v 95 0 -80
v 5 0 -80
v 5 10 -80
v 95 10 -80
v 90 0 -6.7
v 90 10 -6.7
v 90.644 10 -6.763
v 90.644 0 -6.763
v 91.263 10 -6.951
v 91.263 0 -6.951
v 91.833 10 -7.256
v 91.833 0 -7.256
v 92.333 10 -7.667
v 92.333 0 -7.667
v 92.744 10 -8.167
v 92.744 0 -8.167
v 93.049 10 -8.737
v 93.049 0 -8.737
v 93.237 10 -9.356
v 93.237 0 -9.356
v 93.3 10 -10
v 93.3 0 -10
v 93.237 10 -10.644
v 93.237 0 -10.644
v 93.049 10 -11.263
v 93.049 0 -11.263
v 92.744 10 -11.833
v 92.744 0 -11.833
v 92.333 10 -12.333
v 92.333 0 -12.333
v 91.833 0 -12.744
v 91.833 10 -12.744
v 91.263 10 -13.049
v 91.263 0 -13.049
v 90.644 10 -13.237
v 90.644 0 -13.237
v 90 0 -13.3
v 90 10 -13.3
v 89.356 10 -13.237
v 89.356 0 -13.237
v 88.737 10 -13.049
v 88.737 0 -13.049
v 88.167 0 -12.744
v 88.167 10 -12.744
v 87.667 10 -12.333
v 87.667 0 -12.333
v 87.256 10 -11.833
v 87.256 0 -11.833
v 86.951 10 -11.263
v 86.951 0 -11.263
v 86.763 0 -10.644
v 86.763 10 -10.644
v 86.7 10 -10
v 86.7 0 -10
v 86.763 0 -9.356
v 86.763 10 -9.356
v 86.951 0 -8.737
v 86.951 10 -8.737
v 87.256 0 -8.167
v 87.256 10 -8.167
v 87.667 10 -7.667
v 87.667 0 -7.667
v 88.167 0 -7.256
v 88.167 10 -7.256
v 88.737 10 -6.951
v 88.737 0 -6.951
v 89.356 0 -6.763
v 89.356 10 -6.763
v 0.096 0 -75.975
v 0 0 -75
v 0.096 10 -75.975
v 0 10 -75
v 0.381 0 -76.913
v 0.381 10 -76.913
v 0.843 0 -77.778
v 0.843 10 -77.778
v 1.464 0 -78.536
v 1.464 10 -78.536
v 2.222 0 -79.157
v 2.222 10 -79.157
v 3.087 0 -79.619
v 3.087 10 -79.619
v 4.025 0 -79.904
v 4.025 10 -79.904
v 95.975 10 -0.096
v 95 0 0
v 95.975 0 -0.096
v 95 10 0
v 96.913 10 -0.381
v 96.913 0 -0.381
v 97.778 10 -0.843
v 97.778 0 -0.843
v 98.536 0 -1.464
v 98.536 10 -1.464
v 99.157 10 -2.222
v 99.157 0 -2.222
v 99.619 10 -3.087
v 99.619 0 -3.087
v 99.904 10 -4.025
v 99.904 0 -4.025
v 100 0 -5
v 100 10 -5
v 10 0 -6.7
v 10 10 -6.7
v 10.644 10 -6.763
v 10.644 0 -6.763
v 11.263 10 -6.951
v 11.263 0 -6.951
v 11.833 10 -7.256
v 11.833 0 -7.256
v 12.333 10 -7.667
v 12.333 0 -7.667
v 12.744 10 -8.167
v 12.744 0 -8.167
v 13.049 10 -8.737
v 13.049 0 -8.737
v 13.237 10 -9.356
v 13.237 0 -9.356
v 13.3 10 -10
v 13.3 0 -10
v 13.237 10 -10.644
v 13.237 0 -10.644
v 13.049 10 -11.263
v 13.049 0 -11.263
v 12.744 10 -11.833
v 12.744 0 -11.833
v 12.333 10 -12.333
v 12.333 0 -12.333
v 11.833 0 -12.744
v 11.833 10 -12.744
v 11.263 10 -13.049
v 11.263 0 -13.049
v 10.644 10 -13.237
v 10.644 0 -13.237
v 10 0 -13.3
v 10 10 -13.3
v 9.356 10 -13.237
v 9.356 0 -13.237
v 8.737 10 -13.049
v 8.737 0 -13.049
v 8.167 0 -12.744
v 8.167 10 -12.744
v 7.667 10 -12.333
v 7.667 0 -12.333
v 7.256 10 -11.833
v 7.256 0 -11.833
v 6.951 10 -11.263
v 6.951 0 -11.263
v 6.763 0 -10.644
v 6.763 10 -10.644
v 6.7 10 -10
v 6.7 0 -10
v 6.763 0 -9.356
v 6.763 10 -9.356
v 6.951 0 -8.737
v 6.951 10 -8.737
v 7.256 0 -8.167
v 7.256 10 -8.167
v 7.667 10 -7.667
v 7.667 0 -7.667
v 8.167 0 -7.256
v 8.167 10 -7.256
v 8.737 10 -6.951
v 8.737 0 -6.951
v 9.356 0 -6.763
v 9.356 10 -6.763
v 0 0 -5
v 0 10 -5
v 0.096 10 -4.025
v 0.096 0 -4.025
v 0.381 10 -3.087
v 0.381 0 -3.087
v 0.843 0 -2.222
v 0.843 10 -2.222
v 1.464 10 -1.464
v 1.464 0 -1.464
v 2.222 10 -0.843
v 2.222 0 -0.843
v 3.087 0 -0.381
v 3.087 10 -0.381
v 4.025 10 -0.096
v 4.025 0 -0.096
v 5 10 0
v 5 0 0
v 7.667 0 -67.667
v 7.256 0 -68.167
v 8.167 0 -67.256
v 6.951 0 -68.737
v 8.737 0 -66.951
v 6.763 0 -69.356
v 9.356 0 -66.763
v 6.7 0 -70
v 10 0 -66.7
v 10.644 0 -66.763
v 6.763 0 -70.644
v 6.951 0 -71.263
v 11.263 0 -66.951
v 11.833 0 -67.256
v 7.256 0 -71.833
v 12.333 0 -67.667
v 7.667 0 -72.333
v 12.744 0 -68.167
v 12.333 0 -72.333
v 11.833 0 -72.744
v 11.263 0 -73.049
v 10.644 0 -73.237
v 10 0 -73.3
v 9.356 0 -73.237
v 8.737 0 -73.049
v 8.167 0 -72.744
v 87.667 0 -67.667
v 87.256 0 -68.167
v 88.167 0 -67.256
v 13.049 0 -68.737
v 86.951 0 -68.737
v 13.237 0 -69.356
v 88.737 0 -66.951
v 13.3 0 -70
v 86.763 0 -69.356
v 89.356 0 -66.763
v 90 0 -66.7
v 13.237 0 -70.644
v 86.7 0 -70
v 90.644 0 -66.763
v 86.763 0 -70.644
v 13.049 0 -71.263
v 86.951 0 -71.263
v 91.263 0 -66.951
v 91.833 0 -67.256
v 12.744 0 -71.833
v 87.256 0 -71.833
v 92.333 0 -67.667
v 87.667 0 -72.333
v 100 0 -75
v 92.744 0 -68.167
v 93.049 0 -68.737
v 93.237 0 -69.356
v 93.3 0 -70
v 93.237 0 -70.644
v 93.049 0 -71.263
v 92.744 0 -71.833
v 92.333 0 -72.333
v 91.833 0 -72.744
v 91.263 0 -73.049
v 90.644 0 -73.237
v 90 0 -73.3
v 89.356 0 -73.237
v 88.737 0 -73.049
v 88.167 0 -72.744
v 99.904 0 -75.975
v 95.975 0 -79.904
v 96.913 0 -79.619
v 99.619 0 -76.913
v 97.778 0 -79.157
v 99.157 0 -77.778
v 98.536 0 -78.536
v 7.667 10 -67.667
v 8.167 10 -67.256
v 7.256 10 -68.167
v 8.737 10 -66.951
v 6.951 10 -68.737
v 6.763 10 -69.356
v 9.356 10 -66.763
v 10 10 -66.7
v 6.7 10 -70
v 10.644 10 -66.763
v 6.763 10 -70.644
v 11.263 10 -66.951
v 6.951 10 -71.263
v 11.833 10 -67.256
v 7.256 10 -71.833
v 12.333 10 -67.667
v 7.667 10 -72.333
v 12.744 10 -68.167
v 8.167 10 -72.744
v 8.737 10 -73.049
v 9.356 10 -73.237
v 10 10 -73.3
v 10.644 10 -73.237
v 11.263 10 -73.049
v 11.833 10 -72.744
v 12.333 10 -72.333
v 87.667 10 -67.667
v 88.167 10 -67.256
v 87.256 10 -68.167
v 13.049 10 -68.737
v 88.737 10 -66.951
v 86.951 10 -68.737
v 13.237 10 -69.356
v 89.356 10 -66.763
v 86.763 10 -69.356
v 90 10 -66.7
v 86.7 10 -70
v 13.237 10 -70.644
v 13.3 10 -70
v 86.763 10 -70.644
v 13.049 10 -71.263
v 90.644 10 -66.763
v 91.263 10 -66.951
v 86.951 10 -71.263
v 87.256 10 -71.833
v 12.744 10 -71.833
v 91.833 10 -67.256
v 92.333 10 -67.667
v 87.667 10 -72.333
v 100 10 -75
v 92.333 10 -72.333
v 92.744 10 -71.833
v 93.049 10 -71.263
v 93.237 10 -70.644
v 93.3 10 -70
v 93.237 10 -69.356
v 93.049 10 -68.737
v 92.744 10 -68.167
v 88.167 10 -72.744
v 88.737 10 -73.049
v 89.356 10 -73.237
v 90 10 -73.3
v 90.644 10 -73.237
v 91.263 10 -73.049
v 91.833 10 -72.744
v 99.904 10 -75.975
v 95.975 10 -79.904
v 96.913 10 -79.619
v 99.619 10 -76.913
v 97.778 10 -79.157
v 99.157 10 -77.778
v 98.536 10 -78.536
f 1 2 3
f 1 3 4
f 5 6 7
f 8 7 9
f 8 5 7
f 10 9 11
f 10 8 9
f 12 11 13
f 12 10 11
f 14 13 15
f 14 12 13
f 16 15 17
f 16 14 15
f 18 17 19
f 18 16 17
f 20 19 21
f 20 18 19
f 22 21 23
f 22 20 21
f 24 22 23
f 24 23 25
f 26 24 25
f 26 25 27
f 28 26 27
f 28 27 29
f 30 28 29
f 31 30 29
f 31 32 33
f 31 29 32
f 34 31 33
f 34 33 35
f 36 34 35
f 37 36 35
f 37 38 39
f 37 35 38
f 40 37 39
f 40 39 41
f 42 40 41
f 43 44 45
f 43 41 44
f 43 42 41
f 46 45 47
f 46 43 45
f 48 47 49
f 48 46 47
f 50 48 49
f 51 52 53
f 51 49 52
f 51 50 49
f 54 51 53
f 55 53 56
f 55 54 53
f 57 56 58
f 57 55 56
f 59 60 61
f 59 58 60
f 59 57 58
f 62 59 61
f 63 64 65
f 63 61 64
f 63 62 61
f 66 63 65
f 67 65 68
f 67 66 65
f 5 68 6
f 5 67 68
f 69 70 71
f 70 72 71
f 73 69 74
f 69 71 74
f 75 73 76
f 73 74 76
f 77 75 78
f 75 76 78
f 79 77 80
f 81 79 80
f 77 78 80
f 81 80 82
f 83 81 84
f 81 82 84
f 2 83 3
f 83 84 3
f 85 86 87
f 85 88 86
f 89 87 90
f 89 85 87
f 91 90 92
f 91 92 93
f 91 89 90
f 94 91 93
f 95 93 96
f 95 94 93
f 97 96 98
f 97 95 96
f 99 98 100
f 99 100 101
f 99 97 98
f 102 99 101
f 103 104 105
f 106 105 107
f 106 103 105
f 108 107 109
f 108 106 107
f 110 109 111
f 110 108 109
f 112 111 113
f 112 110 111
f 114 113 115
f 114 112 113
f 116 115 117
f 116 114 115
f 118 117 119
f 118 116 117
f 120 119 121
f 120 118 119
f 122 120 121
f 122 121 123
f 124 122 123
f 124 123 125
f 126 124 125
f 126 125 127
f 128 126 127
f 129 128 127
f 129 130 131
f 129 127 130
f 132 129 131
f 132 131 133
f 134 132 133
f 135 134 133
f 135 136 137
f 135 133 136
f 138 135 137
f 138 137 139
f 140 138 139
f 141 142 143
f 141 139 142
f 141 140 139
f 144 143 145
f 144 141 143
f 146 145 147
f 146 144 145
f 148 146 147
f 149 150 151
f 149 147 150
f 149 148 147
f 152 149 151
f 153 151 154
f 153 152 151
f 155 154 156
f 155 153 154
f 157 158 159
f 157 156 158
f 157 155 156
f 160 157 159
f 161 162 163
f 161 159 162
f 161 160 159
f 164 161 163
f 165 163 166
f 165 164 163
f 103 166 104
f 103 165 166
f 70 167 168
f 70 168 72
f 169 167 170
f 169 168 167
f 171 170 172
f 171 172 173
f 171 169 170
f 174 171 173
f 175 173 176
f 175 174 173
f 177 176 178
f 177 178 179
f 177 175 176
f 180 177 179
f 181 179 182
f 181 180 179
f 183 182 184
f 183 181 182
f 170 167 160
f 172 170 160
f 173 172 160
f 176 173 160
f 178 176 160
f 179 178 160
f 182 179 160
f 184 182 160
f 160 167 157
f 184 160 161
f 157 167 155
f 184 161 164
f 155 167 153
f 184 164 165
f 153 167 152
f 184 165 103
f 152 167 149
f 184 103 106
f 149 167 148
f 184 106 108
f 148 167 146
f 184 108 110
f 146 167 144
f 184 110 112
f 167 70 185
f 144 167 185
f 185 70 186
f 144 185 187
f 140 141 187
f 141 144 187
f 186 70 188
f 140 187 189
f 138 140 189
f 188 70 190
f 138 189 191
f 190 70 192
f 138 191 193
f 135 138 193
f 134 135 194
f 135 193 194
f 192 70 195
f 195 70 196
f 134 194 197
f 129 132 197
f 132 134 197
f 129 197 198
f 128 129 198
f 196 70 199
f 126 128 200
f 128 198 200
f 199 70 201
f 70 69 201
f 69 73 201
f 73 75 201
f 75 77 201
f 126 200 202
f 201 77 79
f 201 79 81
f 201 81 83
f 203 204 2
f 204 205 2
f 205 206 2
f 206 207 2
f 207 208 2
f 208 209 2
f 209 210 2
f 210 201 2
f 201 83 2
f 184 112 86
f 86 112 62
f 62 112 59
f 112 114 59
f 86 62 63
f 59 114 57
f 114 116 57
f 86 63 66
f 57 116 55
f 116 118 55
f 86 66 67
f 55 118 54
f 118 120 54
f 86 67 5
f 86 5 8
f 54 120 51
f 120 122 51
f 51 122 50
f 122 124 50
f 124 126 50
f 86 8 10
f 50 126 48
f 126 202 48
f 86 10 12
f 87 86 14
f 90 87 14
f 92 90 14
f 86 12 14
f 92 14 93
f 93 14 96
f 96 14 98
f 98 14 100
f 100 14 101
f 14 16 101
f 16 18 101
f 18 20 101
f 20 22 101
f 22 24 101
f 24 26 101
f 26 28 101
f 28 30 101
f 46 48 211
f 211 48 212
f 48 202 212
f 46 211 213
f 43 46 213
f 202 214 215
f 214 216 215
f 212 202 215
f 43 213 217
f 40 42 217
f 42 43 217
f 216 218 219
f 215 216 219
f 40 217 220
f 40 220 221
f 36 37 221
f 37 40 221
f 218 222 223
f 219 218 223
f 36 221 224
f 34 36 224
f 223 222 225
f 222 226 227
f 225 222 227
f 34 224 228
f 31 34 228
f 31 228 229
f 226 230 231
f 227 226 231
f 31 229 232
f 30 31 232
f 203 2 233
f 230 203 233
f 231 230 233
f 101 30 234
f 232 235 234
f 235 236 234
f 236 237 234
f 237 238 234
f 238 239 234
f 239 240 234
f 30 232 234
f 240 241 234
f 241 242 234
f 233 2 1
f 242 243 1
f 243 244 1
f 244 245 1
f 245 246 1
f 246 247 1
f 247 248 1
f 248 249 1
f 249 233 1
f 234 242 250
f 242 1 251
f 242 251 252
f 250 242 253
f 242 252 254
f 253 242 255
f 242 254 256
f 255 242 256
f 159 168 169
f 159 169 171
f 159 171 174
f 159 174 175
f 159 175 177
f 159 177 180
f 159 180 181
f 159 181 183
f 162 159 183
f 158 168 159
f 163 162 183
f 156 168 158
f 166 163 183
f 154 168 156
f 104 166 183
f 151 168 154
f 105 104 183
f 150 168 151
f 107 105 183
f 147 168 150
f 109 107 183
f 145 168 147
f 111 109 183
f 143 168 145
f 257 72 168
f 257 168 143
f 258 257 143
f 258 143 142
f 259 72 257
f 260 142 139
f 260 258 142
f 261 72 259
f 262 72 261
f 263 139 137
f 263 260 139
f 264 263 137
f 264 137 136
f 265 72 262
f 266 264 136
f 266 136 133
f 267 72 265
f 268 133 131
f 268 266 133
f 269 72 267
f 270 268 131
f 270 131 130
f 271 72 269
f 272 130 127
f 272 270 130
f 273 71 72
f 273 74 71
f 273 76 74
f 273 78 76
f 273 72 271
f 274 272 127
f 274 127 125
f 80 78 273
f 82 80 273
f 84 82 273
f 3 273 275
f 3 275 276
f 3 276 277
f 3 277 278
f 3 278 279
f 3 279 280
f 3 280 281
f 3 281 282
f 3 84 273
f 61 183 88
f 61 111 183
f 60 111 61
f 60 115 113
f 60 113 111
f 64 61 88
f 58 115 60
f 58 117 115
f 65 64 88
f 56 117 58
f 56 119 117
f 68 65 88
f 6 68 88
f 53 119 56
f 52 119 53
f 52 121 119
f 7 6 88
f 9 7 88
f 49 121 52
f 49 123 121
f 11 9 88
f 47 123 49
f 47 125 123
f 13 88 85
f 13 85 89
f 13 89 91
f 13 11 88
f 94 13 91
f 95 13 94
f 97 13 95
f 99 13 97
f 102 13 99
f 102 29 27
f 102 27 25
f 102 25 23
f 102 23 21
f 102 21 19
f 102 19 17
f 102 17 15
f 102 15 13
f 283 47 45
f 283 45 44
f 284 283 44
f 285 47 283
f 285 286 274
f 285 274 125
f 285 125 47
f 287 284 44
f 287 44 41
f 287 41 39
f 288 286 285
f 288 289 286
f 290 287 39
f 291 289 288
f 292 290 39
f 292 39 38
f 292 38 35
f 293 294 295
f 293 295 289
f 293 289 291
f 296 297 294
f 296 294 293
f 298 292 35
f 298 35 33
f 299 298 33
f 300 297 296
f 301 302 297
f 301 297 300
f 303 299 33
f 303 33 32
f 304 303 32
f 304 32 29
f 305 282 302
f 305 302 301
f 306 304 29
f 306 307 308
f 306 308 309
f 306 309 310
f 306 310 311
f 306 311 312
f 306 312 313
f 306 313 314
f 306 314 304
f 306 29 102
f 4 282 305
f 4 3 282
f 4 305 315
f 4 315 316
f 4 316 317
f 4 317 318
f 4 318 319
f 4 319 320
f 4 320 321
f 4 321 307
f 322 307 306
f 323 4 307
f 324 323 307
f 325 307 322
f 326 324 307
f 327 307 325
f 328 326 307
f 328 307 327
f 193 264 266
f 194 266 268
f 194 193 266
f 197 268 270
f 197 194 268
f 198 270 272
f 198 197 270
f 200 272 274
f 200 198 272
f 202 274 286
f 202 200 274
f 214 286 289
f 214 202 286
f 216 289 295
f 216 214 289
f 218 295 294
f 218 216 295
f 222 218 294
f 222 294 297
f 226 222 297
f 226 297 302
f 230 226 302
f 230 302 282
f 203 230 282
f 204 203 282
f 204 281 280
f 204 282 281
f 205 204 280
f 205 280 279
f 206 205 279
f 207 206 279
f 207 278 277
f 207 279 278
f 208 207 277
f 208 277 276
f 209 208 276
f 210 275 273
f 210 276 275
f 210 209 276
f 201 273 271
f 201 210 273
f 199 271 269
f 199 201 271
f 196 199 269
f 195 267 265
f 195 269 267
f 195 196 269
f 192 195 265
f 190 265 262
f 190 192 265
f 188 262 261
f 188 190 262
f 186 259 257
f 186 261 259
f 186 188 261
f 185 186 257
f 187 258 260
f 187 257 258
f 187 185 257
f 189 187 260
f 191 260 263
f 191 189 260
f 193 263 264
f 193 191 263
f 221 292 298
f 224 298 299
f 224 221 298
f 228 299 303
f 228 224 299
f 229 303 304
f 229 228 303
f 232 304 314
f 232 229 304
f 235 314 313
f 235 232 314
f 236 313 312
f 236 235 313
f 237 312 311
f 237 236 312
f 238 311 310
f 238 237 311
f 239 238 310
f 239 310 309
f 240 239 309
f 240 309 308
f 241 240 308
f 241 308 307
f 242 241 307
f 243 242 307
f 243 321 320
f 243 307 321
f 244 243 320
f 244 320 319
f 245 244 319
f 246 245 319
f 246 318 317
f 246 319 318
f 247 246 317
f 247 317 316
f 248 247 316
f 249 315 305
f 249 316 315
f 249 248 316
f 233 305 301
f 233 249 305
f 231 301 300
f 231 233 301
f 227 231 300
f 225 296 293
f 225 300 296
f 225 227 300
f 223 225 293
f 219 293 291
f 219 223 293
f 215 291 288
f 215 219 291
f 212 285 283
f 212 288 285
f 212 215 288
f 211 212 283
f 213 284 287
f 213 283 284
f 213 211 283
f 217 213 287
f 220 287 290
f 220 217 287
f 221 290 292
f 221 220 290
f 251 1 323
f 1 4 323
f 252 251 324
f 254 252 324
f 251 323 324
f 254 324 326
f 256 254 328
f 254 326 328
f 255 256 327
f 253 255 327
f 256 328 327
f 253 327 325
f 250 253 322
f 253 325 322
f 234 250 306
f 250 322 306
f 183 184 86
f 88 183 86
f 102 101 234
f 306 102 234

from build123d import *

# Parameters (mm, degrees)
SKETCH_1_W          = 100
SKETCH_1_H          = 80
EXTRUDE_1_DEPTH     = 10
SKETCH_2_R          = 3.3
CUT_EXTRUDE_1_DEPTH = 129.452325787
FILLET_1_R          = 5


with BuildPart() as part:
    # 草圖1 → 填料-伸長1 (new body)
    with BuildSketch(Plane(origin=(0, 0, 0), x_dir=(1, 0, 0), z_dir=(0, 1, 0))):
        with Locations((50, 40)):
            Rectangle(SKETCH_1_W, SKETCH_1_H)
    extrude(amount=EXTRUDE_1_DEPTH)

    # 草圖2 → 除料-伸長1 (cut, through all)
    with BuildSketch(Plane(origin=(0, 0, 0), x_dir=(1, 0, 0), z_dir=(0, 1, 0))):
        with Locations(Location((10, 10, 0), (0, 0, 270))):
            Circle(SKETCH_2_R)
        with Locations(Location((90, 10, 0), (0, 0, 270))):
            Circle(SKETCH_2_R)
        with Locations(Location((10, 70, 0), (0, 0, 270))):
            Circle(SKETCH_2_R)
        with Locations(Location((90, 70, 0), (0, 0, 270))):
            Circle(SKETCH_2_R)
    extrude(amount=CUT_EXTRUDE_1_DEPTH, mode=Mode.SUBTRACT)

    # 圓角1
    fillet_1_edges = [part.edges().sort_by_distance(p)[0] for p in [
        (0, 5, -80),
        (100, 5, -80),
        (100, 5, 0),
        (0, 5, 0),
    ]]
    fillet(fillet_1_edges, radius=FILLET_1_R)


solid = part.part
